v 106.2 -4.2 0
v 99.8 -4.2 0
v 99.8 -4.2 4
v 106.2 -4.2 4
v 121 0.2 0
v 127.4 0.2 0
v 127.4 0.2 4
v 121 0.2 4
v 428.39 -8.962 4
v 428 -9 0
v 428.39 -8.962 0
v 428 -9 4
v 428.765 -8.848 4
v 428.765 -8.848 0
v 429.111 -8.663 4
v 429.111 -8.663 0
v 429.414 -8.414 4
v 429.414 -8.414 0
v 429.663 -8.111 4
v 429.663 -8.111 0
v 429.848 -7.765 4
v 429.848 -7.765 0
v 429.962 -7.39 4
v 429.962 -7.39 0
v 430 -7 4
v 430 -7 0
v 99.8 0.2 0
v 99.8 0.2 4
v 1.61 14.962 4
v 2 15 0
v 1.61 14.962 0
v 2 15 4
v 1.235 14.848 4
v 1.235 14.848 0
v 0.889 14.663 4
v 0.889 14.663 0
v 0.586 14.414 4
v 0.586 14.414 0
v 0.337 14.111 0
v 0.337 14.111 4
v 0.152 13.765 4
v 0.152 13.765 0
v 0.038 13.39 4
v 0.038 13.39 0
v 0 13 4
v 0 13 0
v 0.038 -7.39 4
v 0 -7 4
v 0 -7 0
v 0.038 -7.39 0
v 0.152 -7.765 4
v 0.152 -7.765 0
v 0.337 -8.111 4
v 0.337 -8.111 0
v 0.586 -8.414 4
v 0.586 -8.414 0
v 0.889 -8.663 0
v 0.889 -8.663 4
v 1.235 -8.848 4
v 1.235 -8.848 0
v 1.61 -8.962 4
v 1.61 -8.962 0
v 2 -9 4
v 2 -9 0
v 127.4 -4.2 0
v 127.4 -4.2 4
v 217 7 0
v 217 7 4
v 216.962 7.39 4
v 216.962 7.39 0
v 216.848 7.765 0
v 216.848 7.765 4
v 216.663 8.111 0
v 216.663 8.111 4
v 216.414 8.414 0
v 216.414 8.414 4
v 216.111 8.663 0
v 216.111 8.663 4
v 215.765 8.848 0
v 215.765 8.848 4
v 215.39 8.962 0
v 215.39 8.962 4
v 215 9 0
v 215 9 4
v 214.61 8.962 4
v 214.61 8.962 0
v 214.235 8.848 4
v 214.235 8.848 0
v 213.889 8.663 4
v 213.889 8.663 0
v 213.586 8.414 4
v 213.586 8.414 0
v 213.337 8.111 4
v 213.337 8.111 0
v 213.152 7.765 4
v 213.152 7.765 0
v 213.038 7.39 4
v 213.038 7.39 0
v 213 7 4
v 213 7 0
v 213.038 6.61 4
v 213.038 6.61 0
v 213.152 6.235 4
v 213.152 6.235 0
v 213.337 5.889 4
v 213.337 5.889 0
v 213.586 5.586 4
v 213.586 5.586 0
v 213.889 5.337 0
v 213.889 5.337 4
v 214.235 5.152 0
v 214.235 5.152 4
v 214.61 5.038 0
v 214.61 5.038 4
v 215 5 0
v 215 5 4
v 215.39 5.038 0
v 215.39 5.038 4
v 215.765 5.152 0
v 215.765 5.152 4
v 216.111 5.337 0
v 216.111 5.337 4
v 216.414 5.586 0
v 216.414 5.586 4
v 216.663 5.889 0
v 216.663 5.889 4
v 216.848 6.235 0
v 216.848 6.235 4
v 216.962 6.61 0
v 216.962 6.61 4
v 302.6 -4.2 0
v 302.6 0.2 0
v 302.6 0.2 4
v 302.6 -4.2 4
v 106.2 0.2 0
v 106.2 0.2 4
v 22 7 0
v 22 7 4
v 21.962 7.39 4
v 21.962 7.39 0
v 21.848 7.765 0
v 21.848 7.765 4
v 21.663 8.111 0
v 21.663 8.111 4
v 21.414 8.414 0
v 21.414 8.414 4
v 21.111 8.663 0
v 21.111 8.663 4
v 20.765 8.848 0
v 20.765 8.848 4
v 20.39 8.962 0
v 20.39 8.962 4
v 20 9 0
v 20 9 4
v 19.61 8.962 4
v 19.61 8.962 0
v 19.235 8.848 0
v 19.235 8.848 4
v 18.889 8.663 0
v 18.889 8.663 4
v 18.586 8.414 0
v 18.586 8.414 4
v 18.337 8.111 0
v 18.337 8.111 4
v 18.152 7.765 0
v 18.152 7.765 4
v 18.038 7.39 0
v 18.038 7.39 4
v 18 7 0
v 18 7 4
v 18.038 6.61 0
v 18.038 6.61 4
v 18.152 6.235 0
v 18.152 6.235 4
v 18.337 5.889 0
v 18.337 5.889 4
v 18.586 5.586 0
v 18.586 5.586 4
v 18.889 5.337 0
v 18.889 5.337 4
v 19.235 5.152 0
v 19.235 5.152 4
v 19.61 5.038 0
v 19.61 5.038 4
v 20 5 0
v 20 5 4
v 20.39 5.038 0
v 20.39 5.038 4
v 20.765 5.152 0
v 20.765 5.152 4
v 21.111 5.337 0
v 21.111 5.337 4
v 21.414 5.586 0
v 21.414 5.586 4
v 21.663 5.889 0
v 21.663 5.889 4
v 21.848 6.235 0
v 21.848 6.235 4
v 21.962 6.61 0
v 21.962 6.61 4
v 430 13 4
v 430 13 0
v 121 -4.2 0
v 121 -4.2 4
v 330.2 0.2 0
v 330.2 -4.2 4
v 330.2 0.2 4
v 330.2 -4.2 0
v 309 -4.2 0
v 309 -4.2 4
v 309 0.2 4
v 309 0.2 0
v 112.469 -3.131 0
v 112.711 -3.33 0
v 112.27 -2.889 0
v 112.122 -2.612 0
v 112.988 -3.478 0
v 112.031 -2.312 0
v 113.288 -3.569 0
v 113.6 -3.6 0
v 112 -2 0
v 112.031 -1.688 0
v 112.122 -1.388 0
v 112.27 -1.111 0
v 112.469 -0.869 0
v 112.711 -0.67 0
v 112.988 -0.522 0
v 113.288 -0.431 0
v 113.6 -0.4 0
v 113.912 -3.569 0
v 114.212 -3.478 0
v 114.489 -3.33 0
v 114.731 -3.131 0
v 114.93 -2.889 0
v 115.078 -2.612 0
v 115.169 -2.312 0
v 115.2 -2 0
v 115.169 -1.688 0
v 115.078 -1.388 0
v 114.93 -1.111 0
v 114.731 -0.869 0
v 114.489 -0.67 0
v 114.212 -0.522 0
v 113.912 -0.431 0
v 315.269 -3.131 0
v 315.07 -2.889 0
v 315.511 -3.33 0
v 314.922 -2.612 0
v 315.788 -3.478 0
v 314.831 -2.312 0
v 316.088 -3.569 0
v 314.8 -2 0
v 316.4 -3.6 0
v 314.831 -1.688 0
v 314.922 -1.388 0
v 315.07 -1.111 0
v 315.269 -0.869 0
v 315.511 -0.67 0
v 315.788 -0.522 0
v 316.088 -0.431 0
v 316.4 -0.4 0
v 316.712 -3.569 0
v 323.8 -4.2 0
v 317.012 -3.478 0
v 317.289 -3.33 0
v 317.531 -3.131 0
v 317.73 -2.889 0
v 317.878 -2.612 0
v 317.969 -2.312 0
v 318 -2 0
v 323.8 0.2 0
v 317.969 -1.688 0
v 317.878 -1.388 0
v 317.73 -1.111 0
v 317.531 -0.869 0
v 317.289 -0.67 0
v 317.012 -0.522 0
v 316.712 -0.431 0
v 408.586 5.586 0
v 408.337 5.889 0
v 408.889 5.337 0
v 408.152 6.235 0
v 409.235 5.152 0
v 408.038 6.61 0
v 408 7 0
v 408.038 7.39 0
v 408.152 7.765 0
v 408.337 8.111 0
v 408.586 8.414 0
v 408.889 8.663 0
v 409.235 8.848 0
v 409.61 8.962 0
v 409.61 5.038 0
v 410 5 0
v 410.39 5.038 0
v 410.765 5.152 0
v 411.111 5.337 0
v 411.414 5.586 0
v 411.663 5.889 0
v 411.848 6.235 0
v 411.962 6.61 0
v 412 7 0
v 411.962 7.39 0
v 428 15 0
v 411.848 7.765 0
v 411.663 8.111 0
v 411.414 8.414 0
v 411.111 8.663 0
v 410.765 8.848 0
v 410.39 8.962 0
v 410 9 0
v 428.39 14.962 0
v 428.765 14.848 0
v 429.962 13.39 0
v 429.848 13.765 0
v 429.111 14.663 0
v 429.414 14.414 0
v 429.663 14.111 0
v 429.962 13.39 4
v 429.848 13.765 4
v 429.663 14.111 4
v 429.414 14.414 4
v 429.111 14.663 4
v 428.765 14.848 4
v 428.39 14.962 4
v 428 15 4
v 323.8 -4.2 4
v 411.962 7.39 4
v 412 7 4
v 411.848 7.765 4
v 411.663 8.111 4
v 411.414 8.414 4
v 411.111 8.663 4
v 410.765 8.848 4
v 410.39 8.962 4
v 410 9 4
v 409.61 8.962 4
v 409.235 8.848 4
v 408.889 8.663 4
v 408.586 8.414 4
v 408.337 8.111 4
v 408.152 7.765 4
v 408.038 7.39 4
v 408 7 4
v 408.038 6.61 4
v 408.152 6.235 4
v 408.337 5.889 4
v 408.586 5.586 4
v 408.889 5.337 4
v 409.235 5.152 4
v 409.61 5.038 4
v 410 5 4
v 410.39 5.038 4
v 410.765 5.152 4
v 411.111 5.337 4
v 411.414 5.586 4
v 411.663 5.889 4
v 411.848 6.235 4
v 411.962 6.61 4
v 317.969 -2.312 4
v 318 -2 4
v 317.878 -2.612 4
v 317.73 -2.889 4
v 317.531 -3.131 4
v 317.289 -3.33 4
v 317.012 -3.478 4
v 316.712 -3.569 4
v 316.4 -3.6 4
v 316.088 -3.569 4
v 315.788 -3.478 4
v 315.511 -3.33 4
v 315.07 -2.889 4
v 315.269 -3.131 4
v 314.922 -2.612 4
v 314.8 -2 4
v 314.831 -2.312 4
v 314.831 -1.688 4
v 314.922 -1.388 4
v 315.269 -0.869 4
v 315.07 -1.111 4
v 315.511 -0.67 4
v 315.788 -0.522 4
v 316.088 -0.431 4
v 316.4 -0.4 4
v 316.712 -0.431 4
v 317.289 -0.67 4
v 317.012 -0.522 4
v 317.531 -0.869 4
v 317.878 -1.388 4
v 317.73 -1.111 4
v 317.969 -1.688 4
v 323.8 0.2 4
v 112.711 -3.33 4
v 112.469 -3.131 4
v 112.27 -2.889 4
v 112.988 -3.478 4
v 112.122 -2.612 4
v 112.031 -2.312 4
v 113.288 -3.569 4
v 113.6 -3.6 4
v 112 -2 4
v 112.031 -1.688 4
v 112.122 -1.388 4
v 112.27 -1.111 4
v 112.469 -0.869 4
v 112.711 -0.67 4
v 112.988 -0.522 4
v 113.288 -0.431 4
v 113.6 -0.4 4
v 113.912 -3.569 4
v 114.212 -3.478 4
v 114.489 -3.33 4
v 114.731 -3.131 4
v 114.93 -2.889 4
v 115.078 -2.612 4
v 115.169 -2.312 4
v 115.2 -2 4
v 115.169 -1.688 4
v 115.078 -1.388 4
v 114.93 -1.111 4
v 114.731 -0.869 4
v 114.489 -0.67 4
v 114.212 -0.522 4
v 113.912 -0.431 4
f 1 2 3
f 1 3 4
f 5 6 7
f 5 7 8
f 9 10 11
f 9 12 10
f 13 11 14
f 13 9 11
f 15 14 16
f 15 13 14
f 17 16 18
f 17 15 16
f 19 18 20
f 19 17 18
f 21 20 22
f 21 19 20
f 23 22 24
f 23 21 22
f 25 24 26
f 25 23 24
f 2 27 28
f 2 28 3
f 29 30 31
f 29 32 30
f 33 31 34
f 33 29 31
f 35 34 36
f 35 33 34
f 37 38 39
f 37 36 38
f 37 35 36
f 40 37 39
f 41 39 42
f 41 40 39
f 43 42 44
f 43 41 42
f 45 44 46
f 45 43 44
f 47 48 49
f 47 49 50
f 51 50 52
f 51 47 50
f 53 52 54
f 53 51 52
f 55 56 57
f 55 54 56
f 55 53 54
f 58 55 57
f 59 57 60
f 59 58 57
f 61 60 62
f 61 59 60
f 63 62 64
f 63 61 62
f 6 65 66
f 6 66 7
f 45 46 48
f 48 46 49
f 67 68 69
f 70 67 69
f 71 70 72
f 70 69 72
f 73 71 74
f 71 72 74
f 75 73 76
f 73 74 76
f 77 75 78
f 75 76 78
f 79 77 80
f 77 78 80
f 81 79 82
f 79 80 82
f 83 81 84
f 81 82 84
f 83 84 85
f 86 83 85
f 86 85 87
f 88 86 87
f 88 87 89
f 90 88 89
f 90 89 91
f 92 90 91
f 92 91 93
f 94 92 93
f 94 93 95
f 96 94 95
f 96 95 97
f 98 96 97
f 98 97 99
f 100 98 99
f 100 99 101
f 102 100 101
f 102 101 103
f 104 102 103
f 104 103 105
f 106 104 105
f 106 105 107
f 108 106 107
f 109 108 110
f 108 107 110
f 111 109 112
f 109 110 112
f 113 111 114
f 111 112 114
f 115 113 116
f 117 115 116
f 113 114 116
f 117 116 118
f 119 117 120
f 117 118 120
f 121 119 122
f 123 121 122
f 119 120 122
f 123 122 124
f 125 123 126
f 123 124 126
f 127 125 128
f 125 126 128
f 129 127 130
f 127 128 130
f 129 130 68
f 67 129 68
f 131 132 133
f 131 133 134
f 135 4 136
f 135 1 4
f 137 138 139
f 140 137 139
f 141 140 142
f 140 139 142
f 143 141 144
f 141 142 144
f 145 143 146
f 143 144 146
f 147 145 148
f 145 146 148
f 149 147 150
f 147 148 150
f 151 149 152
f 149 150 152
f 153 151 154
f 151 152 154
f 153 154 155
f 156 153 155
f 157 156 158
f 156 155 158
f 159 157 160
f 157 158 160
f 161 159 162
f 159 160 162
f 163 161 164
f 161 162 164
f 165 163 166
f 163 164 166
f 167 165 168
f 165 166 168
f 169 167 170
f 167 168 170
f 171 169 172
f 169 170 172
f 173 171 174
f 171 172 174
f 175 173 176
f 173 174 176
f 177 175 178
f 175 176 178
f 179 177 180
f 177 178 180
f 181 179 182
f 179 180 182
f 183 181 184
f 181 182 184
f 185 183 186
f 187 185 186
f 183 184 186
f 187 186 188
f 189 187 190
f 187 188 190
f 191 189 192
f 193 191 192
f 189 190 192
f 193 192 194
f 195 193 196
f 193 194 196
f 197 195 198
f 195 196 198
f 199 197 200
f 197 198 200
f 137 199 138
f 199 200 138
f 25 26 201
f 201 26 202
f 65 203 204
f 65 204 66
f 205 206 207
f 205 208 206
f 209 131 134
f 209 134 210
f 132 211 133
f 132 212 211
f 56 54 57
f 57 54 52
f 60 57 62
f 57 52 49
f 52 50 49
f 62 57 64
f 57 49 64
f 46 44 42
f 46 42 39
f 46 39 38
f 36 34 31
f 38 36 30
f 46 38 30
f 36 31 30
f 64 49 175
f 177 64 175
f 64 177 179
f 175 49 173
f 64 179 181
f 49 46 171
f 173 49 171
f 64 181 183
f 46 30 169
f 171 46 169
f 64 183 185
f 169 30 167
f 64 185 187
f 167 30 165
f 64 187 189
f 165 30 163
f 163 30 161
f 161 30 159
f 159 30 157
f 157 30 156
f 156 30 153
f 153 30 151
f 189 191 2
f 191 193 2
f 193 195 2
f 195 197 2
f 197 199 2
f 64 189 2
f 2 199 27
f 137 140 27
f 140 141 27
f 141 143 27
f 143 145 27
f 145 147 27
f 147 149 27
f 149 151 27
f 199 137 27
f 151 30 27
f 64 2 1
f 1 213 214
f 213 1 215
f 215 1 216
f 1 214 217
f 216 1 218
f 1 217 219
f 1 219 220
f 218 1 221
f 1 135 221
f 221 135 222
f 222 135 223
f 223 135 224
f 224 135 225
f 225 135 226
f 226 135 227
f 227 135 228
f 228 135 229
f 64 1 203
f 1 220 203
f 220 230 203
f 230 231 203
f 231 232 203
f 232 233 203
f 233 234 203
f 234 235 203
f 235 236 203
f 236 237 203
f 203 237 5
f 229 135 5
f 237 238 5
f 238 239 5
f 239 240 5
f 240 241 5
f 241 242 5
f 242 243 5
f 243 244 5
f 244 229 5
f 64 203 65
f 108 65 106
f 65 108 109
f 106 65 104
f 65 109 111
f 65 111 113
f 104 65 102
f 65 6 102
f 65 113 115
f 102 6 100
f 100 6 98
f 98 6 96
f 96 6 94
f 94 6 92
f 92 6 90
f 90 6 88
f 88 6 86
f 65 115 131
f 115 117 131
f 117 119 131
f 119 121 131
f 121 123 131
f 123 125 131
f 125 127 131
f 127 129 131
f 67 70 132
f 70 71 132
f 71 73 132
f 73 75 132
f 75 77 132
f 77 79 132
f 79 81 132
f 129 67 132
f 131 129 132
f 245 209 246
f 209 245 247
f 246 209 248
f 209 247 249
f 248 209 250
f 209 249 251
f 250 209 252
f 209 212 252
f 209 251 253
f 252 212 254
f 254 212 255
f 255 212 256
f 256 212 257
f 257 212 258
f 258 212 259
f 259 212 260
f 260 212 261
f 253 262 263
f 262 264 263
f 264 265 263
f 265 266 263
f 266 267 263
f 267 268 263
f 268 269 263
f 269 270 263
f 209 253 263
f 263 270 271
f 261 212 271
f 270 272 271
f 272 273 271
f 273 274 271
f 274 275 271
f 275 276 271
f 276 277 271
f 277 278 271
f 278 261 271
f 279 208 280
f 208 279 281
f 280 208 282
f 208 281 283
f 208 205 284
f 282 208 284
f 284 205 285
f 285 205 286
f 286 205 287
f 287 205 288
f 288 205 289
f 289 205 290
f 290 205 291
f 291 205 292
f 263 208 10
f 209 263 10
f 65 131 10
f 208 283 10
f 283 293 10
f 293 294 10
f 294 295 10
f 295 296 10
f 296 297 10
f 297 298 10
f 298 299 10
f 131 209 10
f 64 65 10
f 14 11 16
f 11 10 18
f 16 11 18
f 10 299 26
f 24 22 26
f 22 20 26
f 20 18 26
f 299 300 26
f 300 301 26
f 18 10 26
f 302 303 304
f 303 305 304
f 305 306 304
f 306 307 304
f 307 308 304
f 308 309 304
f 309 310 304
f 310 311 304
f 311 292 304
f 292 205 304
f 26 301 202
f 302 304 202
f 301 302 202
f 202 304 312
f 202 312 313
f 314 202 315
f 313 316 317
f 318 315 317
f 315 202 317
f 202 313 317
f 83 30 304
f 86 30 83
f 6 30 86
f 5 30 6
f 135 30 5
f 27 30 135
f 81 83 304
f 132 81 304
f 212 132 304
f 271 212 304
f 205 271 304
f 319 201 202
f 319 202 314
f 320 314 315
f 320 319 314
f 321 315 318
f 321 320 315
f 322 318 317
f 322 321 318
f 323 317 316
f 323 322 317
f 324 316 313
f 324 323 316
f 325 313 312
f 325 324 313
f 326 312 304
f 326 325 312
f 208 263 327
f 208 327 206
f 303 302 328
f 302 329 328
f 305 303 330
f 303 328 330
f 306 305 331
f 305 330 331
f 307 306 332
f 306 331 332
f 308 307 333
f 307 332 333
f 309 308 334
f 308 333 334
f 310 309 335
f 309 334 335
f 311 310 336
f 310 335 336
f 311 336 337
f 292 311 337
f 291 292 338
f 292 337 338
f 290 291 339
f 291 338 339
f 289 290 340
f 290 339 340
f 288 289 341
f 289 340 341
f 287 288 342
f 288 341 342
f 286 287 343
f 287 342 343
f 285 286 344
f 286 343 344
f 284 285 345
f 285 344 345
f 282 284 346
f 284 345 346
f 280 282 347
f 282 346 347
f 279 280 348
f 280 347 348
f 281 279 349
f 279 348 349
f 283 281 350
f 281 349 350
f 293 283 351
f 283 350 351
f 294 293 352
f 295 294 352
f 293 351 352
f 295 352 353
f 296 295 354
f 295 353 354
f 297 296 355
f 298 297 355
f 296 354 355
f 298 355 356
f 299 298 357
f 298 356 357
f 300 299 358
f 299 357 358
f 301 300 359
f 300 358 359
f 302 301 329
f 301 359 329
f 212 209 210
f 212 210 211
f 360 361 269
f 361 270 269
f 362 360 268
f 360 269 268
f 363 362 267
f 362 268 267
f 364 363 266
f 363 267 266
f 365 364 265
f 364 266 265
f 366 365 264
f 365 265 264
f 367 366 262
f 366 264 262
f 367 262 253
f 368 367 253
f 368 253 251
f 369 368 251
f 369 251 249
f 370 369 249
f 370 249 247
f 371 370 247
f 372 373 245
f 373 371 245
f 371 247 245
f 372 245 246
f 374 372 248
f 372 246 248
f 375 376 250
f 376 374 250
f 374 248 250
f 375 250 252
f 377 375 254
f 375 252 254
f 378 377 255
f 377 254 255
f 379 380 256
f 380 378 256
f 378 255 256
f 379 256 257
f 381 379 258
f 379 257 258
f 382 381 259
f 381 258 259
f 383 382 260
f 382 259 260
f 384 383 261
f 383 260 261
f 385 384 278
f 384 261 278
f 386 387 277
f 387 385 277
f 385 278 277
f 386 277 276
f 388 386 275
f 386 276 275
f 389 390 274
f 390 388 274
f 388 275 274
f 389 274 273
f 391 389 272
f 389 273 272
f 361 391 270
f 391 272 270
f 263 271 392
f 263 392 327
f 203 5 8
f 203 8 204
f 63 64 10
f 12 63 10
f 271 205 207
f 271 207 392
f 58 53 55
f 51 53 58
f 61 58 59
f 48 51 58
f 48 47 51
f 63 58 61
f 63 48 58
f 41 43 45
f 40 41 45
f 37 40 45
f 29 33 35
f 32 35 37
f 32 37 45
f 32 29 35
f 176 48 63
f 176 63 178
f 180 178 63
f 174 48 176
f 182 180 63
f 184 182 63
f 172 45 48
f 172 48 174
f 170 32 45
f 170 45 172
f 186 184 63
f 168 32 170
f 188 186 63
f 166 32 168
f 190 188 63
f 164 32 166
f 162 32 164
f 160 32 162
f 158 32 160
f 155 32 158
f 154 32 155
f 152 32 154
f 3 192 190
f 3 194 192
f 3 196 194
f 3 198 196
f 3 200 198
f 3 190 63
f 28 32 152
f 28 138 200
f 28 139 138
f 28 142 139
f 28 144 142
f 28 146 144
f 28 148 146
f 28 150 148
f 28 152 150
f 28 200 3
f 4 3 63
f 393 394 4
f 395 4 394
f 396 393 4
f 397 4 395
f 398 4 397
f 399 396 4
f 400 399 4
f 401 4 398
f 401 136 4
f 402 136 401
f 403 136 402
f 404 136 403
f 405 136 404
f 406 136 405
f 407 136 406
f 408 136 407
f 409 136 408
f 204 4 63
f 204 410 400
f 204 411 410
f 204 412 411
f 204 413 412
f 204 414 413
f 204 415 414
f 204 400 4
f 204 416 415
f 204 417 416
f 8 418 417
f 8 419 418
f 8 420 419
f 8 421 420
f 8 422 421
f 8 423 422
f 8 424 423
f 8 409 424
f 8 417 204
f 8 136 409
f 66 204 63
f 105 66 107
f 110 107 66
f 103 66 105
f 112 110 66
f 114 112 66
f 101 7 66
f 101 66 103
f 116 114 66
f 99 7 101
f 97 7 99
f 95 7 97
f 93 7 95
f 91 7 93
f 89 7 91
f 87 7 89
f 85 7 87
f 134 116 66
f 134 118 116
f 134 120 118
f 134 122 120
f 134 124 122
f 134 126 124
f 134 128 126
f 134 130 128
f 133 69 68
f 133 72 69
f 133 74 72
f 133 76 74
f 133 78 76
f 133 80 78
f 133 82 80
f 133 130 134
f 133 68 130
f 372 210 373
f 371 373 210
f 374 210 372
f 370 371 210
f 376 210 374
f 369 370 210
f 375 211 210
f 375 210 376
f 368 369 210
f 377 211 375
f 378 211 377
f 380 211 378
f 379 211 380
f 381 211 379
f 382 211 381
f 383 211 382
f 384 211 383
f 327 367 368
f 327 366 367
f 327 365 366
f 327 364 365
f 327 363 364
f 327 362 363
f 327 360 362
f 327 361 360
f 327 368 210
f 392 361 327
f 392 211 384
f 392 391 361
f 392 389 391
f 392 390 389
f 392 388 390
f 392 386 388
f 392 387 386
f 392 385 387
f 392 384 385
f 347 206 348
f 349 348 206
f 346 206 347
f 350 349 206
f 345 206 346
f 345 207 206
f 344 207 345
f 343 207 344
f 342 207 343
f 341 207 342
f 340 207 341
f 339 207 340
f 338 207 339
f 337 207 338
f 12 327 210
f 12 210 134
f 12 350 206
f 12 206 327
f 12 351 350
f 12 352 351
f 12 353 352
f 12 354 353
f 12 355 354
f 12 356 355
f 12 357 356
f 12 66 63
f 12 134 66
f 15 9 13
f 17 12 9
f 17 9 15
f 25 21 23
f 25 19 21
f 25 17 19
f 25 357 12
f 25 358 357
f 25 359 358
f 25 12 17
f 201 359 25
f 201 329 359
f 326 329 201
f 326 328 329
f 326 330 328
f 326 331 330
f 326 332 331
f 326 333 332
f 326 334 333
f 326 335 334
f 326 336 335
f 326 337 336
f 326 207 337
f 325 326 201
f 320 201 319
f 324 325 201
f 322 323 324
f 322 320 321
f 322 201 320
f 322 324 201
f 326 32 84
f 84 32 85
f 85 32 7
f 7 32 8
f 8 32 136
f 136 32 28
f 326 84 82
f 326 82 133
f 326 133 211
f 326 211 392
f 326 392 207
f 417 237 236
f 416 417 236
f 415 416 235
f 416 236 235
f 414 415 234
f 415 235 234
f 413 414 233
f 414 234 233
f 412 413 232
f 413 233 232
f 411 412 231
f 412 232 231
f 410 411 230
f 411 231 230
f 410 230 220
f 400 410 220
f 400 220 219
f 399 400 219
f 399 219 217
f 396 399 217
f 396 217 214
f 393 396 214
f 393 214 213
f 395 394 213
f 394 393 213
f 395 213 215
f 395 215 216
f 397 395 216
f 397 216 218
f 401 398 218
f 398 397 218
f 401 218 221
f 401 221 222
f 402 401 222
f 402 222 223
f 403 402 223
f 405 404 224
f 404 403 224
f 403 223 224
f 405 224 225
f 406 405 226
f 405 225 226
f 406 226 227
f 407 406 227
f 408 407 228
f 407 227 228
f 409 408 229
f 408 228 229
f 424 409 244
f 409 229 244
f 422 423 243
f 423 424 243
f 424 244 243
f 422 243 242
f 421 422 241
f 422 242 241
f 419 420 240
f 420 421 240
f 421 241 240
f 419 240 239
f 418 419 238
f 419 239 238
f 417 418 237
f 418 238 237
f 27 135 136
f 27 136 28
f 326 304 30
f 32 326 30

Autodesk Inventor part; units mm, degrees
ref_plane "YZ Plane" through (0, 0, 0) normal (1, 0, 0) x (0, 1, 0)
ref_plane "XZ Plane" through (0, 0, 0) normal (0, 1, 0) x (-1, 0, 0)
ref_plane "XY Plane" through (0, 0, 0) normal (0, 0, 1) x (1, 0, 0)
sketch "Sketch1" plane through (0, 0, 0) normal (0, 0, 1) x (1, 0, 0)
  line L0 (430, 0) -> (430, -4) projected
  line L1 (100, -4) -> (100, 0) construction
  line L2 (0, 0) -> (100, 0) construction
  line L3 (0, 0) -> (0, -4) projected
  line L4 (100, -4) -> (0, -4) construction
  line L5 (0, -9) -> (430, -9)
  line L6 (430, -9) -> (430, 15)
  line L7 (430, 15) -> (0, 15)
  line L8 (0, 15) -> (0, -9)
  line L9 (324, 0) -> (324, -4) construction
  line L10 (330, 0) -> (330, -4) construction
  line L11 (302.8, 0) -> (302.8, -4) construction
  line L12 (308.8, 0) -> (308.8, -4) construction
  line L13 (318.1, -4) -> (314.7, -4) construction
  line L14 (318.1, 0) -> (318.1, -4) construction
  line L15 (314.7, 0) -> (318.1, 0) construction
  line L16 (314.7, 0) -> (314.7, -4) construction
  line L17 (106, 0) -> (106, -4) construction
  line L18 (100, 0) -> (100, -4) construction
  line L19 (121.2, 0) -> (121.2, -4) construction
  line L20 (127.2, 0) -> (127.2, -4) construction
  line L21 (100, 0) -> (106, 0) construction
  line L22 (106, 0) -> (106, -4) construction
  line L23 (106, -4) -> (100, -4) construction
  line L24 (100, -4) -> (100, 0) construction
  line L25 (121.2, 0) -> (127.2, 0) construction
  line L26 (127.2, 0) -> (127.2, -4) construction
  line L27 (127.2, -4) -> (121.2, -4) construction
  line L28 (121.2, -4) -> (121.2, 0) construction
  line L29 (302.8, 0) -> (308.8, 0) construction
  line L30 (308.8, 0) -> (308.8, -4) construction
  line L31 (308.8, -4) -> (302.8, -4) construction
  line L32 (302.8, -4) -> (302.8, 0) construction
  line L33 (324, 0) -> (330, 0) construction
  line L34 (330, 0) -> (330, -4) construction
  line L35 (330, -4) -> (324, -4) construction
  line L36 (324, -4) -> (324, 0) construction
  line L37 (115.3, -4) -> (111.9, -4) construction
  line L38 (115.3, 0) -> (115.3, -4) construction
  line L39 (111.9, 0) -> (115.3, 0) construction
  line L40 (111.9, 0) -> (111.9, -4) construction
  line L41 (106.2, 0.2) -> (99.8, 0.2)
  line L42 (99.8, 0.2) -> (99.8, -4.2)
  line L43 (99.8, -4.2) -> (106.2, -4.2)
  line L44 (106.2, -4.2) -> (106.2, 0.2)
  line L45 (127.4, 0.2) -> (121, 0.2)
  line L46 (121, 0.2) -> (121, -4.2)
  line L47 (121, -4.2) -> (127.4, -4.2)
  line L48 (127.4, -4.2) -> (127.4, 0.2)
  line L49 (309, 0.2) -> (302.6, 0.2)
  line L50 (302.6, 0.2) -> (302.6, -4.2)
  line L51 (302.6, -4.2) -> (309, -4.2)
  line L52 (309, -4.2) -> (309, 0.2)
  line L53 (330.2, 0.2) -> (323.8, 0.2)
  line L54 (323.8, 0.2) -> (323.8, -4.2)
  line L55 (323.8, -4.2) -> (330.2, -4.2)
  line L56 (330.2, -4.2) -> (330.2, 0.2)
  circle A0 centre (316.4, -2) radius 1.6
  circle A1 centre (113.6, -2) radius 1.6
  dimension "d0" = 5
  dimension "d1" = 15
  dimension "d2" = 0.2
  dimension "d3" = 0.2
  dimension "d4" = 0.2
  dimension "d5" = 0.2
  dimension "d6" = 3.2
  dimension "d7" = 3.2
extrude "Extrusion1" add sketch "Sketch1" along normal blind 4
fillet "Fillet1" radius 2 4 edges at (0, 15, 2) (0, -9, 2) (430, 15, 2) (430, -9, 2)
sketch "Sketch2" plane through (0, 0, 4) normal (0, 0, 1) x (1, 0, 0)
  circle A0 centre (20, 7) radius 2
  circle A1 centre (215, 7) radius 2
  circle A2 centre (410, 7) radius 2
  line L0 (0, 13) -> (0, -7) projected
  line L1 (430, -7) -> (430, 13) projected
  line L2 (428, 15) -> (2, 15) projected
  point P0 (0, 0)
  dimension "d11" = 4
  dimension "d12" = 4
  dimension "d13" = 4
  dimension "d14" = 20
  dimension "d15" = 20
  dimension "d16" = 8
  dimension "d17" = 8
  dimension "d18" = 8
extrude "Extrusion2" cut sketch "Sketch2" against normal blind 4
properties part number "wiper"
